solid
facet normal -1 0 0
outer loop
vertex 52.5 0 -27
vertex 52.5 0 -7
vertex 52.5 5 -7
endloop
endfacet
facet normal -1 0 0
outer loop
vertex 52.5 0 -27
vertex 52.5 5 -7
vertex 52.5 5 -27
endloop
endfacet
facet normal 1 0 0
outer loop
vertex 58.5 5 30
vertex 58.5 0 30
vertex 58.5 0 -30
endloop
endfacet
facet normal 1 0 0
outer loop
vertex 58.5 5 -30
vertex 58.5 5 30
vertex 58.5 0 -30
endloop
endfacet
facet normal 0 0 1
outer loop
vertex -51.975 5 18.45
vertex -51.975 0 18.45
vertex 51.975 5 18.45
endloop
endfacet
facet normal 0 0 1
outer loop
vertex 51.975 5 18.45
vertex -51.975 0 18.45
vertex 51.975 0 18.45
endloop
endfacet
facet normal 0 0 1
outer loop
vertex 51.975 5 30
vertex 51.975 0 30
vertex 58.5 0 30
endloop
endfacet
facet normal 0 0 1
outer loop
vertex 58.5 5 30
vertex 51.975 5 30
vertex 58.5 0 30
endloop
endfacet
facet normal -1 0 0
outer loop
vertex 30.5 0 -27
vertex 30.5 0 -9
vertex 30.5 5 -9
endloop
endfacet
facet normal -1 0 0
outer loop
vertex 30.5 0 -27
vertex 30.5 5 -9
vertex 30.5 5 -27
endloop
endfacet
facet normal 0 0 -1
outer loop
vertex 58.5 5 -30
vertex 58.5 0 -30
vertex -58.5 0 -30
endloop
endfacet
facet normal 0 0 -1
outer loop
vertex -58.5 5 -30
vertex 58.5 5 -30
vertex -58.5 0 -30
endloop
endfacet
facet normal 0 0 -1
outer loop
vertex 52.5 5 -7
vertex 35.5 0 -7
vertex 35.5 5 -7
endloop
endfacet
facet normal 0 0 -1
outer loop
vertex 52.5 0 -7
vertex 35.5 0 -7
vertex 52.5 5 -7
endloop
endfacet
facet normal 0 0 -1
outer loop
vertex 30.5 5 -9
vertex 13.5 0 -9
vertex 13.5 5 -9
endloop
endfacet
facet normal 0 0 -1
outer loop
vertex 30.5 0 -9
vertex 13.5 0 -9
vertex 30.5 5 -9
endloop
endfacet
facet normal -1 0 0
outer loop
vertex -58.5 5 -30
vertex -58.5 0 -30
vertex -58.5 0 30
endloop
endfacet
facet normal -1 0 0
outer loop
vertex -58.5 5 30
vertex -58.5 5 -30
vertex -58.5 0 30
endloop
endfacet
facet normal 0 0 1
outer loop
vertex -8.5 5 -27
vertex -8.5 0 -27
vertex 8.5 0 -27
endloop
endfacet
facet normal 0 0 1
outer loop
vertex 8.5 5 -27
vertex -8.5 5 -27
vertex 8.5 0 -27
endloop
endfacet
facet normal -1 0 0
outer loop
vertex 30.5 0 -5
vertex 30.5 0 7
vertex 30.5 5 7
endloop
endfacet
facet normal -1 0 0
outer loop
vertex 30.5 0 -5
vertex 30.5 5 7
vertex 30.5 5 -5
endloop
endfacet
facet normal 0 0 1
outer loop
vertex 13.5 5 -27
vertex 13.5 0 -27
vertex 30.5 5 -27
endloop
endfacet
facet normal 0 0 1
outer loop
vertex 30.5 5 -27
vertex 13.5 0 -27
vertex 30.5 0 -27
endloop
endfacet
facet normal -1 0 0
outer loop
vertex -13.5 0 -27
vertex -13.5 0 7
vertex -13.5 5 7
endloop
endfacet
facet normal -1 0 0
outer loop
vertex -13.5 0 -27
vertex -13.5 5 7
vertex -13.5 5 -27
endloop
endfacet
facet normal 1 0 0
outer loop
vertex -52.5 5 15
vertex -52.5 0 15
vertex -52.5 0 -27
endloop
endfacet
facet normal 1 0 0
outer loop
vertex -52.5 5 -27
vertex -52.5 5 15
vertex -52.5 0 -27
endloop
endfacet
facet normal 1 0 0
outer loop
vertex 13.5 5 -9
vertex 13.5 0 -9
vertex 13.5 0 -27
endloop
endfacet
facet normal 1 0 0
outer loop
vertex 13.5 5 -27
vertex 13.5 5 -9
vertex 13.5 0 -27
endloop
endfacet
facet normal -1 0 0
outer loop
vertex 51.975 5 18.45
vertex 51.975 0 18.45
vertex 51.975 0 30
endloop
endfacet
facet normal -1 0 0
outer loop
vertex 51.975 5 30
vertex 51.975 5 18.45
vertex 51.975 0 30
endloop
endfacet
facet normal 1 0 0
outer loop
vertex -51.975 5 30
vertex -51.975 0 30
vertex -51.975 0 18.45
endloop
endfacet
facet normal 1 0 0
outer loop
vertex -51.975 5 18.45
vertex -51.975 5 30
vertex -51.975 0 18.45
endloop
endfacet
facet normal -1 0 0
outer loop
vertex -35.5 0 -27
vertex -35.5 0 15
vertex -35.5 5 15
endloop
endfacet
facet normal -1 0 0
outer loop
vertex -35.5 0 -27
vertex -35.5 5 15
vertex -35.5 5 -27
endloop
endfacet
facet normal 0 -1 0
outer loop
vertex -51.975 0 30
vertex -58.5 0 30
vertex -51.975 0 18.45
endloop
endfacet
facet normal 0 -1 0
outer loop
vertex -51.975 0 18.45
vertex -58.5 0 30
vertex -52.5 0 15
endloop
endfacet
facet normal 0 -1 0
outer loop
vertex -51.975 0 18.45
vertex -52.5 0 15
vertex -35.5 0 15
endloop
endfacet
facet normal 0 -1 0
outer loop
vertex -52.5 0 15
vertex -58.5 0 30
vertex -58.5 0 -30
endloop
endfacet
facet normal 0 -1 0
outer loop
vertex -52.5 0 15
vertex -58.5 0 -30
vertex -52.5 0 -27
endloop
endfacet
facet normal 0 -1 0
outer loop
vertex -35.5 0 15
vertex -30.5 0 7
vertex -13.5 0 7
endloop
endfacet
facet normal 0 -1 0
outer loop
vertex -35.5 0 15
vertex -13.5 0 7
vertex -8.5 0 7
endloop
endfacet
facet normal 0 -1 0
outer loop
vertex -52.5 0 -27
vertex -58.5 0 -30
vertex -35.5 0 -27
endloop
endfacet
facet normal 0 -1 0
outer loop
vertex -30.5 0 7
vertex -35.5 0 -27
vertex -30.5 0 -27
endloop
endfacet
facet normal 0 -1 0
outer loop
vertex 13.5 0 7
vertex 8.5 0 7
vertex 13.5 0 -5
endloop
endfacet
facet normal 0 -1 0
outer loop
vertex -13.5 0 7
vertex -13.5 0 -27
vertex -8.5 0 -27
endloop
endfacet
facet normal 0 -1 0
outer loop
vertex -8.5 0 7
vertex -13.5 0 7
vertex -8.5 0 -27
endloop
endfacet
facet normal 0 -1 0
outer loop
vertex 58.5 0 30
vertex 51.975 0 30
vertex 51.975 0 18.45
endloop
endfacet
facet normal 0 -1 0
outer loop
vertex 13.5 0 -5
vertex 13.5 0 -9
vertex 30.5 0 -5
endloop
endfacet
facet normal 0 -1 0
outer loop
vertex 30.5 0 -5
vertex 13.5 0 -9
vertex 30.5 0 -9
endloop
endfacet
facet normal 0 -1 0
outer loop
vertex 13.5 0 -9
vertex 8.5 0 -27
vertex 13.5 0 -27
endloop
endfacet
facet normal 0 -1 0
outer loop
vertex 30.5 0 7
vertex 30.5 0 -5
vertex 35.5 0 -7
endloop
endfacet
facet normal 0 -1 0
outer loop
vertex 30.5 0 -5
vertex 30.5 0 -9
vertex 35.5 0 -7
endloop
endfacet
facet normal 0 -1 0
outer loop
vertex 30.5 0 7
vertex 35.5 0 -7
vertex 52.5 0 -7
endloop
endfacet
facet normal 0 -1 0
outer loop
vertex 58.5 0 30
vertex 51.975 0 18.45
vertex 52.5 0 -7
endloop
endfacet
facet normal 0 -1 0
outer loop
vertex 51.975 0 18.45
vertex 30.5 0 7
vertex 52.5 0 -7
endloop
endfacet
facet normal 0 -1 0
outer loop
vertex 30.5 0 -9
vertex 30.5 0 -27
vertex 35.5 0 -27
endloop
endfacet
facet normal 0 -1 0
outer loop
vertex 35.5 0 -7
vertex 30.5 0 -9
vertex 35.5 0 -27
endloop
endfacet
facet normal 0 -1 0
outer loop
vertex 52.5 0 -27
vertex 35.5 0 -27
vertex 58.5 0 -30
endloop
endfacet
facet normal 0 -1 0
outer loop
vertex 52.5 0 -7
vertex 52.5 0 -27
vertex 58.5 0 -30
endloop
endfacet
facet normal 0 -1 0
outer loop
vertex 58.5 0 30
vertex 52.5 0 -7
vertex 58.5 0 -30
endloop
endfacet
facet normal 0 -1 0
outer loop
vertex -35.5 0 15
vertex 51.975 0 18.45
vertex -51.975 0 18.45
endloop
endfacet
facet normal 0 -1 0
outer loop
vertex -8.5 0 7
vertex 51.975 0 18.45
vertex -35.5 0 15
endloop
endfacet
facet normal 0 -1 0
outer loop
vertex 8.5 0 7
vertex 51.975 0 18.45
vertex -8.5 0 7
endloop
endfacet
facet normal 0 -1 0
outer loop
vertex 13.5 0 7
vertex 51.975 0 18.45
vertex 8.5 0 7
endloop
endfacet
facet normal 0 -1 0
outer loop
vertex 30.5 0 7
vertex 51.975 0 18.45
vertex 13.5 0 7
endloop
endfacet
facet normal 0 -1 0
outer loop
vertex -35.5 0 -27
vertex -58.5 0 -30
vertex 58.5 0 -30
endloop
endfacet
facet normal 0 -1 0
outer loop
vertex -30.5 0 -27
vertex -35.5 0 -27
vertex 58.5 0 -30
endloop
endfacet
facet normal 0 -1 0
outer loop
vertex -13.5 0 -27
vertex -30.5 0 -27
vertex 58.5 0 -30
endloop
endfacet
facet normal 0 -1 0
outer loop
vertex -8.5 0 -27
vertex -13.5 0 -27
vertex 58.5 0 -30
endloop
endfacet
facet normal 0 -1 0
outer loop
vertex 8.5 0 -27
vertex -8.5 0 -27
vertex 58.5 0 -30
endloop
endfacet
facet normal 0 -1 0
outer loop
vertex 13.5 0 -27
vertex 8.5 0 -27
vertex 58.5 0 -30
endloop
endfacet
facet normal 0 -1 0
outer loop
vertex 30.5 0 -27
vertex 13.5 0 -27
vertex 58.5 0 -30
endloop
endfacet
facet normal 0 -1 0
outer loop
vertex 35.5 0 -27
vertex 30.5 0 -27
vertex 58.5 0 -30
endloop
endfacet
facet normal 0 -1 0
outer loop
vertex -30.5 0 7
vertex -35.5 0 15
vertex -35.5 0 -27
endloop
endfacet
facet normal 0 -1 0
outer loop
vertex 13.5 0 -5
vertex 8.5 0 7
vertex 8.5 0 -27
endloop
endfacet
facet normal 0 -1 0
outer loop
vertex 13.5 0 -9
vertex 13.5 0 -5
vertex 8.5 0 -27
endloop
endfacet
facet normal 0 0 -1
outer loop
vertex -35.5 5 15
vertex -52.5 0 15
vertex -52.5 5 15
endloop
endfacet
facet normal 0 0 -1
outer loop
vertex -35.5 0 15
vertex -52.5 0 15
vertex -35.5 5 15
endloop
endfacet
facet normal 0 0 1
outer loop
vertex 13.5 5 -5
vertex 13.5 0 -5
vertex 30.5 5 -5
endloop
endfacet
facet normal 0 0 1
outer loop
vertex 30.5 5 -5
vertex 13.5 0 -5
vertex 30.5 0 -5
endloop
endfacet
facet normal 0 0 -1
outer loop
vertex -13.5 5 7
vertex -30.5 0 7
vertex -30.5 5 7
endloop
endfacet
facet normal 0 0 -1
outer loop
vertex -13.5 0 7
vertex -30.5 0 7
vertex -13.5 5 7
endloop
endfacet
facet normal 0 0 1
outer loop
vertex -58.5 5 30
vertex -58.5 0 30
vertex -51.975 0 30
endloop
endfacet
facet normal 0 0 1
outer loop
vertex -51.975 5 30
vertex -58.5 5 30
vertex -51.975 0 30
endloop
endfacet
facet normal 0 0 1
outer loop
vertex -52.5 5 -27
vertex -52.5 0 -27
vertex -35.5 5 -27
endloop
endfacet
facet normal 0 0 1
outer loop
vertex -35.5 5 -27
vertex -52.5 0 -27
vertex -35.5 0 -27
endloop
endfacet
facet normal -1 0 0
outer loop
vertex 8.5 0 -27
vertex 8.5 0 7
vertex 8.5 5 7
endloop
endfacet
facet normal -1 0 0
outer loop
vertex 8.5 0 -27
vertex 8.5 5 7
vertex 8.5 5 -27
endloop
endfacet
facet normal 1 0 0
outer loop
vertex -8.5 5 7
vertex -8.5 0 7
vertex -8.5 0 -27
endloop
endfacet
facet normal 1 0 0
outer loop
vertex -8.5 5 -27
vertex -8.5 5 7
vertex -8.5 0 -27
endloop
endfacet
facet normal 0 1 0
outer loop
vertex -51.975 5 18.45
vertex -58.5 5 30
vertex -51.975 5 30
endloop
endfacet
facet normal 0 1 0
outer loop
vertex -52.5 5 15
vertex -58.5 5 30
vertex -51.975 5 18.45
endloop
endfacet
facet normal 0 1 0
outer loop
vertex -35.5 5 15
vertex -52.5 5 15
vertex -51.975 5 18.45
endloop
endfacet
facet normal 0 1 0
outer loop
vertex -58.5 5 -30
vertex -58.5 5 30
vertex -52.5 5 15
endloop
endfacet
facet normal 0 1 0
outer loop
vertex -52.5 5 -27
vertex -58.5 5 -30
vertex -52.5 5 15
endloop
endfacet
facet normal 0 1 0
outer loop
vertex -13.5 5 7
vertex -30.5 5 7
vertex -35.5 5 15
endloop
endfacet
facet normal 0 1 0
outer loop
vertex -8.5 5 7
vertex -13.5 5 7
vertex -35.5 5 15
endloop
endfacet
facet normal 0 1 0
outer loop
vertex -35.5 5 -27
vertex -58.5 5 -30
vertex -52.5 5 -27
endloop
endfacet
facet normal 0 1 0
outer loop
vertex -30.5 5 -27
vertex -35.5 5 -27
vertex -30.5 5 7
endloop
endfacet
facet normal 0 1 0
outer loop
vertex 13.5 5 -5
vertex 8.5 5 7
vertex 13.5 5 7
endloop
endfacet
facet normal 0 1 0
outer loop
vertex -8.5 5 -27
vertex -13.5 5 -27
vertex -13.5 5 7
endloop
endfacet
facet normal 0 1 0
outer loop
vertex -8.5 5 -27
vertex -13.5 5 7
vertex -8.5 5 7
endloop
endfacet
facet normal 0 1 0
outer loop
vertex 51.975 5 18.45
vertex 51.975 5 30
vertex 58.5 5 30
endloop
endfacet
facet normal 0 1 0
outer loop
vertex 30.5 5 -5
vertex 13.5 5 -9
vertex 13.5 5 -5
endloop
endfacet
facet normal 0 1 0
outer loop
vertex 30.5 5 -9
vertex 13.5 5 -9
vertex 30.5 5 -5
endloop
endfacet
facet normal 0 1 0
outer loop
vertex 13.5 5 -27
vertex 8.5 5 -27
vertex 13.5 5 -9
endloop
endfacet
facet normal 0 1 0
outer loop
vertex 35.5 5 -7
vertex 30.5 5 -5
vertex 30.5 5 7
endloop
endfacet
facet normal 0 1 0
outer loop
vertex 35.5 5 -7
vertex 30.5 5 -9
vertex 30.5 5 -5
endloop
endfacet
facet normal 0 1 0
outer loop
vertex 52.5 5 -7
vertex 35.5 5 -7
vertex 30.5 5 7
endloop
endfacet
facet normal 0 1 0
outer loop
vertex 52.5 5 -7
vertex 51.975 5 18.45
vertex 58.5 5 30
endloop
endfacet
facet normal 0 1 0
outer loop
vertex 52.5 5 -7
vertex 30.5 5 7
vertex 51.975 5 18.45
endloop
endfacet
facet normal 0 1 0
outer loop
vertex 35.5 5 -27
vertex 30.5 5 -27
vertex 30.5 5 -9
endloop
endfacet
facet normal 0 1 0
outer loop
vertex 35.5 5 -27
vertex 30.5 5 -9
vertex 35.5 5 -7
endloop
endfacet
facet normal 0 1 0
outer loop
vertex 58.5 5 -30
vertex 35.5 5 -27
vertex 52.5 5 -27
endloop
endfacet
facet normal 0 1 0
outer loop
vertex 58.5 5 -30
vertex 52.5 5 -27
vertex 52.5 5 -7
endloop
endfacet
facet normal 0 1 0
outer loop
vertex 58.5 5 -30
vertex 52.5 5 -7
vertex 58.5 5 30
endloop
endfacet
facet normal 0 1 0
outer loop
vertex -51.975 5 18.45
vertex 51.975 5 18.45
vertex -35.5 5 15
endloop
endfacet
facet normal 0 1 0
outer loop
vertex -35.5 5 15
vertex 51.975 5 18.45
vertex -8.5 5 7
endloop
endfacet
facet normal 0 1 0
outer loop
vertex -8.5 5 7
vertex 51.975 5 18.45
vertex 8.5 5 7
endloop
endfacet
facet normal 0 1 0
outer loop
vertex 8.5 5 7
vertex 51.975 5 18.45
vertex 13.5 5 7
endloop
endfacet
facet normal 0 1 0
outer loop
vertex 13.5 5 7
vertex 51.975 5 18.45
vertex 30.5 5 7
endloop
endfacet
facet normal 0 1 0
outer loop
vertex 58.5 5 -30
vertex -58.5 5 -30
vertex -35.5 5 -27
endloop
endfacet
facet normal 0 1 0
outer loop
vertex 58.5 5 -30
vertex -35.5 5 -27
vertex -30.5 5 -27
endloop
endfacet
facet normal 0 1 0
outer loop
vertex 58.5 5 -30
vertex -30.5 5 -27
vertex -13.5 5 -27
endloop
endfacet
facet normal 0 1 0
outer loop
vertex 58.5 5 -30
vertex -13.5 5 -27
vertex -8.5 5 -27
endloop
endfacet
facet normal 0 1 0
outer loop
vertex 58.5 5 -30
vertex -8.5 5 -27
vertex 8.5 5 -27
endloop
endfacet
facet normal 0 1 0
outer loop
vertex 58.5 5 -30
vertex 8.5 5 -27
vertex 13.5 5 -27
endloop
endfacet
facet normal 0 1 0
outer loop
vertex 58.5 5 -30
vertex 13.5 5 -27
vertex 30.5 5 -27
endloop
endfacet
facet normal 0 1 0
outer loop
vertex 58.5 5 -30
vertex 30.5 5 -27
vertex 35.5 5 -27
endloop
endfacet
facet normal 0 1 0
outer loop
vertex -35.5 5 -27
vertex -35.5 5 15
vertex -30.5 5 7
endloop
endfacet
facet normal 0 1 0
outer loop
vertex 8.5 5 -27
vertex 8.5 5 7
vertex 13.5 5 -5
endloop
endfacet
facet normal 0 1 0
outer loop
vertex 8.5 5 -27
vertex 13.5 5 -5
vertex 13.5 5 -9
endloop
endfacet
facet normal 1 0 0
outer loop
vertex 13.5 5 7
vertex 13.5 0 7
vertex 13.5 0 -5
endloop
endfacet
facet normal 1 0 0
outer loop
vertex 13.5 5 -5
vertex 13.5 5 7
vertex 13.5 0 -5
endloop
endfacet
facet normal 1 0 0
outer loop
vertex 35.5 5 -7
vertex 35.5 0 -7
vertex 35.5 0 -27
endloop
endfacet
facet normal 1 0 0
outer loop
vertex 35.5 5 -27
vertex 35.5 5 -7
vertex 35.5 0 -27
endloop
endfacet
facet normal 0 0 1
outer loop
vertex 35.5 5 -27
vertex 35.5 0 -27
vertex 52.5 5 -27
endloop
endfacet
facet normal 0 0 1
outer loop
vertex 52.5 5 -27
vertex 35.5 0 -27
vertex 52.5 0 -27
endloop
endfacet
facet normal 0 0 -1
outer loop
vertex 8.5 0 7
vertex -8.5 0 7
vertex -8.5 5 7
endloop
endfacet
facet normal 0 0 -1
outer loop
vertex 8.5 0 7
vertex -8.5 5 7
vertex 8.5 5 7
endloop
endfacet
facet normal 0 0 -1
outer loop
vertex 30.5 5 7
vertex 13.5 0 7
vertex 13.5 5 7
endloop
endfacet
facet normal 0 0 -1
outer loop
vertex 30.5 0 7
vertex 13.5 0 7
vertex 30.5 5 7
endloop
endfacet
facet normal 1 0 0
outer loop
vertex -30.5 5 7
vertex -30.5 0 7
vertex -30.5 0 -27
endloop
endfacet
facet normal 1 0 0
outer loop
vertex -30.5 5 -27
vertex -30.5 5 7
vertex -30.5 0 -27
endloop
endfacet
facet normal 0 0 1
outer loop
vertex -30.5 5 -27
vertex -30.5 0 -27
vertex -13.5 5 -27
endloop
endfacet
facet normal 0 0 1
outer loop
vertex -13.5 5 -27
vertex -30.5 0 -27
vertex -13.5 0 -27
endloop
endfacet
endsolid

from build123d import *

# Parameters (mm, degrees)
SKETCH1_W           = 17
SKETCH1_H           = 12
SKETCH1_H_2         = 42
SKETCH1_H_3         = 34
SKETCH1_H_4         = 18
SKETCH1_H_5         = 20
BOSS_EXTRUDE1_DEPTH = 5


with BuildPart() as part:
    # Sketch1 → Boss-Extrude1 (new body)
    with BuildSketch(Plane(origin=(0, 0, 0), x_dir=(1, 0, 0), z_dir=(0, 1, 0))):
        Polygon((-58.5, 30), (-58.5, -30), (-51.975, -30), (-51.975, -18.45), (51.975, -18.45), (51.975, -30), (58.5, -30), (58.5, 30), align=None)
        with Locations((22, -1)):
            Rectangle(SKETCH1_W, SKETCH1_H, mode=Mode.SUBTRACT)
        with Locations((-44, 6)):
            Rectangle(SKETCH1_W, SKETCH1_H_2, mode=Mode.SUBTRACT)
        with Locations((-22, 10)):
            Rectangle(SKETCH1_W, SKETCH1_H_3, mode=Mode.SUBTRACT)
        with Locations((0, 10)):
            Rectangle(SKETCH1_W, SKETCH1_H_3, mode=Mode.SUBTRACT)
        with Locations((22, 18)):
            Rectangle(SKETCH1_W, SKETCH1_H_4, mode=Mode.SUBTRACT)
        with Locations((44, 17)):
            Rectangle(SKETCH1_W, SKETCH1_H_5, mode=Mode.SUBTRACT)
    extrude(amount=BOSS_EXTRUDE1_DEPTH)


solid = part.part
